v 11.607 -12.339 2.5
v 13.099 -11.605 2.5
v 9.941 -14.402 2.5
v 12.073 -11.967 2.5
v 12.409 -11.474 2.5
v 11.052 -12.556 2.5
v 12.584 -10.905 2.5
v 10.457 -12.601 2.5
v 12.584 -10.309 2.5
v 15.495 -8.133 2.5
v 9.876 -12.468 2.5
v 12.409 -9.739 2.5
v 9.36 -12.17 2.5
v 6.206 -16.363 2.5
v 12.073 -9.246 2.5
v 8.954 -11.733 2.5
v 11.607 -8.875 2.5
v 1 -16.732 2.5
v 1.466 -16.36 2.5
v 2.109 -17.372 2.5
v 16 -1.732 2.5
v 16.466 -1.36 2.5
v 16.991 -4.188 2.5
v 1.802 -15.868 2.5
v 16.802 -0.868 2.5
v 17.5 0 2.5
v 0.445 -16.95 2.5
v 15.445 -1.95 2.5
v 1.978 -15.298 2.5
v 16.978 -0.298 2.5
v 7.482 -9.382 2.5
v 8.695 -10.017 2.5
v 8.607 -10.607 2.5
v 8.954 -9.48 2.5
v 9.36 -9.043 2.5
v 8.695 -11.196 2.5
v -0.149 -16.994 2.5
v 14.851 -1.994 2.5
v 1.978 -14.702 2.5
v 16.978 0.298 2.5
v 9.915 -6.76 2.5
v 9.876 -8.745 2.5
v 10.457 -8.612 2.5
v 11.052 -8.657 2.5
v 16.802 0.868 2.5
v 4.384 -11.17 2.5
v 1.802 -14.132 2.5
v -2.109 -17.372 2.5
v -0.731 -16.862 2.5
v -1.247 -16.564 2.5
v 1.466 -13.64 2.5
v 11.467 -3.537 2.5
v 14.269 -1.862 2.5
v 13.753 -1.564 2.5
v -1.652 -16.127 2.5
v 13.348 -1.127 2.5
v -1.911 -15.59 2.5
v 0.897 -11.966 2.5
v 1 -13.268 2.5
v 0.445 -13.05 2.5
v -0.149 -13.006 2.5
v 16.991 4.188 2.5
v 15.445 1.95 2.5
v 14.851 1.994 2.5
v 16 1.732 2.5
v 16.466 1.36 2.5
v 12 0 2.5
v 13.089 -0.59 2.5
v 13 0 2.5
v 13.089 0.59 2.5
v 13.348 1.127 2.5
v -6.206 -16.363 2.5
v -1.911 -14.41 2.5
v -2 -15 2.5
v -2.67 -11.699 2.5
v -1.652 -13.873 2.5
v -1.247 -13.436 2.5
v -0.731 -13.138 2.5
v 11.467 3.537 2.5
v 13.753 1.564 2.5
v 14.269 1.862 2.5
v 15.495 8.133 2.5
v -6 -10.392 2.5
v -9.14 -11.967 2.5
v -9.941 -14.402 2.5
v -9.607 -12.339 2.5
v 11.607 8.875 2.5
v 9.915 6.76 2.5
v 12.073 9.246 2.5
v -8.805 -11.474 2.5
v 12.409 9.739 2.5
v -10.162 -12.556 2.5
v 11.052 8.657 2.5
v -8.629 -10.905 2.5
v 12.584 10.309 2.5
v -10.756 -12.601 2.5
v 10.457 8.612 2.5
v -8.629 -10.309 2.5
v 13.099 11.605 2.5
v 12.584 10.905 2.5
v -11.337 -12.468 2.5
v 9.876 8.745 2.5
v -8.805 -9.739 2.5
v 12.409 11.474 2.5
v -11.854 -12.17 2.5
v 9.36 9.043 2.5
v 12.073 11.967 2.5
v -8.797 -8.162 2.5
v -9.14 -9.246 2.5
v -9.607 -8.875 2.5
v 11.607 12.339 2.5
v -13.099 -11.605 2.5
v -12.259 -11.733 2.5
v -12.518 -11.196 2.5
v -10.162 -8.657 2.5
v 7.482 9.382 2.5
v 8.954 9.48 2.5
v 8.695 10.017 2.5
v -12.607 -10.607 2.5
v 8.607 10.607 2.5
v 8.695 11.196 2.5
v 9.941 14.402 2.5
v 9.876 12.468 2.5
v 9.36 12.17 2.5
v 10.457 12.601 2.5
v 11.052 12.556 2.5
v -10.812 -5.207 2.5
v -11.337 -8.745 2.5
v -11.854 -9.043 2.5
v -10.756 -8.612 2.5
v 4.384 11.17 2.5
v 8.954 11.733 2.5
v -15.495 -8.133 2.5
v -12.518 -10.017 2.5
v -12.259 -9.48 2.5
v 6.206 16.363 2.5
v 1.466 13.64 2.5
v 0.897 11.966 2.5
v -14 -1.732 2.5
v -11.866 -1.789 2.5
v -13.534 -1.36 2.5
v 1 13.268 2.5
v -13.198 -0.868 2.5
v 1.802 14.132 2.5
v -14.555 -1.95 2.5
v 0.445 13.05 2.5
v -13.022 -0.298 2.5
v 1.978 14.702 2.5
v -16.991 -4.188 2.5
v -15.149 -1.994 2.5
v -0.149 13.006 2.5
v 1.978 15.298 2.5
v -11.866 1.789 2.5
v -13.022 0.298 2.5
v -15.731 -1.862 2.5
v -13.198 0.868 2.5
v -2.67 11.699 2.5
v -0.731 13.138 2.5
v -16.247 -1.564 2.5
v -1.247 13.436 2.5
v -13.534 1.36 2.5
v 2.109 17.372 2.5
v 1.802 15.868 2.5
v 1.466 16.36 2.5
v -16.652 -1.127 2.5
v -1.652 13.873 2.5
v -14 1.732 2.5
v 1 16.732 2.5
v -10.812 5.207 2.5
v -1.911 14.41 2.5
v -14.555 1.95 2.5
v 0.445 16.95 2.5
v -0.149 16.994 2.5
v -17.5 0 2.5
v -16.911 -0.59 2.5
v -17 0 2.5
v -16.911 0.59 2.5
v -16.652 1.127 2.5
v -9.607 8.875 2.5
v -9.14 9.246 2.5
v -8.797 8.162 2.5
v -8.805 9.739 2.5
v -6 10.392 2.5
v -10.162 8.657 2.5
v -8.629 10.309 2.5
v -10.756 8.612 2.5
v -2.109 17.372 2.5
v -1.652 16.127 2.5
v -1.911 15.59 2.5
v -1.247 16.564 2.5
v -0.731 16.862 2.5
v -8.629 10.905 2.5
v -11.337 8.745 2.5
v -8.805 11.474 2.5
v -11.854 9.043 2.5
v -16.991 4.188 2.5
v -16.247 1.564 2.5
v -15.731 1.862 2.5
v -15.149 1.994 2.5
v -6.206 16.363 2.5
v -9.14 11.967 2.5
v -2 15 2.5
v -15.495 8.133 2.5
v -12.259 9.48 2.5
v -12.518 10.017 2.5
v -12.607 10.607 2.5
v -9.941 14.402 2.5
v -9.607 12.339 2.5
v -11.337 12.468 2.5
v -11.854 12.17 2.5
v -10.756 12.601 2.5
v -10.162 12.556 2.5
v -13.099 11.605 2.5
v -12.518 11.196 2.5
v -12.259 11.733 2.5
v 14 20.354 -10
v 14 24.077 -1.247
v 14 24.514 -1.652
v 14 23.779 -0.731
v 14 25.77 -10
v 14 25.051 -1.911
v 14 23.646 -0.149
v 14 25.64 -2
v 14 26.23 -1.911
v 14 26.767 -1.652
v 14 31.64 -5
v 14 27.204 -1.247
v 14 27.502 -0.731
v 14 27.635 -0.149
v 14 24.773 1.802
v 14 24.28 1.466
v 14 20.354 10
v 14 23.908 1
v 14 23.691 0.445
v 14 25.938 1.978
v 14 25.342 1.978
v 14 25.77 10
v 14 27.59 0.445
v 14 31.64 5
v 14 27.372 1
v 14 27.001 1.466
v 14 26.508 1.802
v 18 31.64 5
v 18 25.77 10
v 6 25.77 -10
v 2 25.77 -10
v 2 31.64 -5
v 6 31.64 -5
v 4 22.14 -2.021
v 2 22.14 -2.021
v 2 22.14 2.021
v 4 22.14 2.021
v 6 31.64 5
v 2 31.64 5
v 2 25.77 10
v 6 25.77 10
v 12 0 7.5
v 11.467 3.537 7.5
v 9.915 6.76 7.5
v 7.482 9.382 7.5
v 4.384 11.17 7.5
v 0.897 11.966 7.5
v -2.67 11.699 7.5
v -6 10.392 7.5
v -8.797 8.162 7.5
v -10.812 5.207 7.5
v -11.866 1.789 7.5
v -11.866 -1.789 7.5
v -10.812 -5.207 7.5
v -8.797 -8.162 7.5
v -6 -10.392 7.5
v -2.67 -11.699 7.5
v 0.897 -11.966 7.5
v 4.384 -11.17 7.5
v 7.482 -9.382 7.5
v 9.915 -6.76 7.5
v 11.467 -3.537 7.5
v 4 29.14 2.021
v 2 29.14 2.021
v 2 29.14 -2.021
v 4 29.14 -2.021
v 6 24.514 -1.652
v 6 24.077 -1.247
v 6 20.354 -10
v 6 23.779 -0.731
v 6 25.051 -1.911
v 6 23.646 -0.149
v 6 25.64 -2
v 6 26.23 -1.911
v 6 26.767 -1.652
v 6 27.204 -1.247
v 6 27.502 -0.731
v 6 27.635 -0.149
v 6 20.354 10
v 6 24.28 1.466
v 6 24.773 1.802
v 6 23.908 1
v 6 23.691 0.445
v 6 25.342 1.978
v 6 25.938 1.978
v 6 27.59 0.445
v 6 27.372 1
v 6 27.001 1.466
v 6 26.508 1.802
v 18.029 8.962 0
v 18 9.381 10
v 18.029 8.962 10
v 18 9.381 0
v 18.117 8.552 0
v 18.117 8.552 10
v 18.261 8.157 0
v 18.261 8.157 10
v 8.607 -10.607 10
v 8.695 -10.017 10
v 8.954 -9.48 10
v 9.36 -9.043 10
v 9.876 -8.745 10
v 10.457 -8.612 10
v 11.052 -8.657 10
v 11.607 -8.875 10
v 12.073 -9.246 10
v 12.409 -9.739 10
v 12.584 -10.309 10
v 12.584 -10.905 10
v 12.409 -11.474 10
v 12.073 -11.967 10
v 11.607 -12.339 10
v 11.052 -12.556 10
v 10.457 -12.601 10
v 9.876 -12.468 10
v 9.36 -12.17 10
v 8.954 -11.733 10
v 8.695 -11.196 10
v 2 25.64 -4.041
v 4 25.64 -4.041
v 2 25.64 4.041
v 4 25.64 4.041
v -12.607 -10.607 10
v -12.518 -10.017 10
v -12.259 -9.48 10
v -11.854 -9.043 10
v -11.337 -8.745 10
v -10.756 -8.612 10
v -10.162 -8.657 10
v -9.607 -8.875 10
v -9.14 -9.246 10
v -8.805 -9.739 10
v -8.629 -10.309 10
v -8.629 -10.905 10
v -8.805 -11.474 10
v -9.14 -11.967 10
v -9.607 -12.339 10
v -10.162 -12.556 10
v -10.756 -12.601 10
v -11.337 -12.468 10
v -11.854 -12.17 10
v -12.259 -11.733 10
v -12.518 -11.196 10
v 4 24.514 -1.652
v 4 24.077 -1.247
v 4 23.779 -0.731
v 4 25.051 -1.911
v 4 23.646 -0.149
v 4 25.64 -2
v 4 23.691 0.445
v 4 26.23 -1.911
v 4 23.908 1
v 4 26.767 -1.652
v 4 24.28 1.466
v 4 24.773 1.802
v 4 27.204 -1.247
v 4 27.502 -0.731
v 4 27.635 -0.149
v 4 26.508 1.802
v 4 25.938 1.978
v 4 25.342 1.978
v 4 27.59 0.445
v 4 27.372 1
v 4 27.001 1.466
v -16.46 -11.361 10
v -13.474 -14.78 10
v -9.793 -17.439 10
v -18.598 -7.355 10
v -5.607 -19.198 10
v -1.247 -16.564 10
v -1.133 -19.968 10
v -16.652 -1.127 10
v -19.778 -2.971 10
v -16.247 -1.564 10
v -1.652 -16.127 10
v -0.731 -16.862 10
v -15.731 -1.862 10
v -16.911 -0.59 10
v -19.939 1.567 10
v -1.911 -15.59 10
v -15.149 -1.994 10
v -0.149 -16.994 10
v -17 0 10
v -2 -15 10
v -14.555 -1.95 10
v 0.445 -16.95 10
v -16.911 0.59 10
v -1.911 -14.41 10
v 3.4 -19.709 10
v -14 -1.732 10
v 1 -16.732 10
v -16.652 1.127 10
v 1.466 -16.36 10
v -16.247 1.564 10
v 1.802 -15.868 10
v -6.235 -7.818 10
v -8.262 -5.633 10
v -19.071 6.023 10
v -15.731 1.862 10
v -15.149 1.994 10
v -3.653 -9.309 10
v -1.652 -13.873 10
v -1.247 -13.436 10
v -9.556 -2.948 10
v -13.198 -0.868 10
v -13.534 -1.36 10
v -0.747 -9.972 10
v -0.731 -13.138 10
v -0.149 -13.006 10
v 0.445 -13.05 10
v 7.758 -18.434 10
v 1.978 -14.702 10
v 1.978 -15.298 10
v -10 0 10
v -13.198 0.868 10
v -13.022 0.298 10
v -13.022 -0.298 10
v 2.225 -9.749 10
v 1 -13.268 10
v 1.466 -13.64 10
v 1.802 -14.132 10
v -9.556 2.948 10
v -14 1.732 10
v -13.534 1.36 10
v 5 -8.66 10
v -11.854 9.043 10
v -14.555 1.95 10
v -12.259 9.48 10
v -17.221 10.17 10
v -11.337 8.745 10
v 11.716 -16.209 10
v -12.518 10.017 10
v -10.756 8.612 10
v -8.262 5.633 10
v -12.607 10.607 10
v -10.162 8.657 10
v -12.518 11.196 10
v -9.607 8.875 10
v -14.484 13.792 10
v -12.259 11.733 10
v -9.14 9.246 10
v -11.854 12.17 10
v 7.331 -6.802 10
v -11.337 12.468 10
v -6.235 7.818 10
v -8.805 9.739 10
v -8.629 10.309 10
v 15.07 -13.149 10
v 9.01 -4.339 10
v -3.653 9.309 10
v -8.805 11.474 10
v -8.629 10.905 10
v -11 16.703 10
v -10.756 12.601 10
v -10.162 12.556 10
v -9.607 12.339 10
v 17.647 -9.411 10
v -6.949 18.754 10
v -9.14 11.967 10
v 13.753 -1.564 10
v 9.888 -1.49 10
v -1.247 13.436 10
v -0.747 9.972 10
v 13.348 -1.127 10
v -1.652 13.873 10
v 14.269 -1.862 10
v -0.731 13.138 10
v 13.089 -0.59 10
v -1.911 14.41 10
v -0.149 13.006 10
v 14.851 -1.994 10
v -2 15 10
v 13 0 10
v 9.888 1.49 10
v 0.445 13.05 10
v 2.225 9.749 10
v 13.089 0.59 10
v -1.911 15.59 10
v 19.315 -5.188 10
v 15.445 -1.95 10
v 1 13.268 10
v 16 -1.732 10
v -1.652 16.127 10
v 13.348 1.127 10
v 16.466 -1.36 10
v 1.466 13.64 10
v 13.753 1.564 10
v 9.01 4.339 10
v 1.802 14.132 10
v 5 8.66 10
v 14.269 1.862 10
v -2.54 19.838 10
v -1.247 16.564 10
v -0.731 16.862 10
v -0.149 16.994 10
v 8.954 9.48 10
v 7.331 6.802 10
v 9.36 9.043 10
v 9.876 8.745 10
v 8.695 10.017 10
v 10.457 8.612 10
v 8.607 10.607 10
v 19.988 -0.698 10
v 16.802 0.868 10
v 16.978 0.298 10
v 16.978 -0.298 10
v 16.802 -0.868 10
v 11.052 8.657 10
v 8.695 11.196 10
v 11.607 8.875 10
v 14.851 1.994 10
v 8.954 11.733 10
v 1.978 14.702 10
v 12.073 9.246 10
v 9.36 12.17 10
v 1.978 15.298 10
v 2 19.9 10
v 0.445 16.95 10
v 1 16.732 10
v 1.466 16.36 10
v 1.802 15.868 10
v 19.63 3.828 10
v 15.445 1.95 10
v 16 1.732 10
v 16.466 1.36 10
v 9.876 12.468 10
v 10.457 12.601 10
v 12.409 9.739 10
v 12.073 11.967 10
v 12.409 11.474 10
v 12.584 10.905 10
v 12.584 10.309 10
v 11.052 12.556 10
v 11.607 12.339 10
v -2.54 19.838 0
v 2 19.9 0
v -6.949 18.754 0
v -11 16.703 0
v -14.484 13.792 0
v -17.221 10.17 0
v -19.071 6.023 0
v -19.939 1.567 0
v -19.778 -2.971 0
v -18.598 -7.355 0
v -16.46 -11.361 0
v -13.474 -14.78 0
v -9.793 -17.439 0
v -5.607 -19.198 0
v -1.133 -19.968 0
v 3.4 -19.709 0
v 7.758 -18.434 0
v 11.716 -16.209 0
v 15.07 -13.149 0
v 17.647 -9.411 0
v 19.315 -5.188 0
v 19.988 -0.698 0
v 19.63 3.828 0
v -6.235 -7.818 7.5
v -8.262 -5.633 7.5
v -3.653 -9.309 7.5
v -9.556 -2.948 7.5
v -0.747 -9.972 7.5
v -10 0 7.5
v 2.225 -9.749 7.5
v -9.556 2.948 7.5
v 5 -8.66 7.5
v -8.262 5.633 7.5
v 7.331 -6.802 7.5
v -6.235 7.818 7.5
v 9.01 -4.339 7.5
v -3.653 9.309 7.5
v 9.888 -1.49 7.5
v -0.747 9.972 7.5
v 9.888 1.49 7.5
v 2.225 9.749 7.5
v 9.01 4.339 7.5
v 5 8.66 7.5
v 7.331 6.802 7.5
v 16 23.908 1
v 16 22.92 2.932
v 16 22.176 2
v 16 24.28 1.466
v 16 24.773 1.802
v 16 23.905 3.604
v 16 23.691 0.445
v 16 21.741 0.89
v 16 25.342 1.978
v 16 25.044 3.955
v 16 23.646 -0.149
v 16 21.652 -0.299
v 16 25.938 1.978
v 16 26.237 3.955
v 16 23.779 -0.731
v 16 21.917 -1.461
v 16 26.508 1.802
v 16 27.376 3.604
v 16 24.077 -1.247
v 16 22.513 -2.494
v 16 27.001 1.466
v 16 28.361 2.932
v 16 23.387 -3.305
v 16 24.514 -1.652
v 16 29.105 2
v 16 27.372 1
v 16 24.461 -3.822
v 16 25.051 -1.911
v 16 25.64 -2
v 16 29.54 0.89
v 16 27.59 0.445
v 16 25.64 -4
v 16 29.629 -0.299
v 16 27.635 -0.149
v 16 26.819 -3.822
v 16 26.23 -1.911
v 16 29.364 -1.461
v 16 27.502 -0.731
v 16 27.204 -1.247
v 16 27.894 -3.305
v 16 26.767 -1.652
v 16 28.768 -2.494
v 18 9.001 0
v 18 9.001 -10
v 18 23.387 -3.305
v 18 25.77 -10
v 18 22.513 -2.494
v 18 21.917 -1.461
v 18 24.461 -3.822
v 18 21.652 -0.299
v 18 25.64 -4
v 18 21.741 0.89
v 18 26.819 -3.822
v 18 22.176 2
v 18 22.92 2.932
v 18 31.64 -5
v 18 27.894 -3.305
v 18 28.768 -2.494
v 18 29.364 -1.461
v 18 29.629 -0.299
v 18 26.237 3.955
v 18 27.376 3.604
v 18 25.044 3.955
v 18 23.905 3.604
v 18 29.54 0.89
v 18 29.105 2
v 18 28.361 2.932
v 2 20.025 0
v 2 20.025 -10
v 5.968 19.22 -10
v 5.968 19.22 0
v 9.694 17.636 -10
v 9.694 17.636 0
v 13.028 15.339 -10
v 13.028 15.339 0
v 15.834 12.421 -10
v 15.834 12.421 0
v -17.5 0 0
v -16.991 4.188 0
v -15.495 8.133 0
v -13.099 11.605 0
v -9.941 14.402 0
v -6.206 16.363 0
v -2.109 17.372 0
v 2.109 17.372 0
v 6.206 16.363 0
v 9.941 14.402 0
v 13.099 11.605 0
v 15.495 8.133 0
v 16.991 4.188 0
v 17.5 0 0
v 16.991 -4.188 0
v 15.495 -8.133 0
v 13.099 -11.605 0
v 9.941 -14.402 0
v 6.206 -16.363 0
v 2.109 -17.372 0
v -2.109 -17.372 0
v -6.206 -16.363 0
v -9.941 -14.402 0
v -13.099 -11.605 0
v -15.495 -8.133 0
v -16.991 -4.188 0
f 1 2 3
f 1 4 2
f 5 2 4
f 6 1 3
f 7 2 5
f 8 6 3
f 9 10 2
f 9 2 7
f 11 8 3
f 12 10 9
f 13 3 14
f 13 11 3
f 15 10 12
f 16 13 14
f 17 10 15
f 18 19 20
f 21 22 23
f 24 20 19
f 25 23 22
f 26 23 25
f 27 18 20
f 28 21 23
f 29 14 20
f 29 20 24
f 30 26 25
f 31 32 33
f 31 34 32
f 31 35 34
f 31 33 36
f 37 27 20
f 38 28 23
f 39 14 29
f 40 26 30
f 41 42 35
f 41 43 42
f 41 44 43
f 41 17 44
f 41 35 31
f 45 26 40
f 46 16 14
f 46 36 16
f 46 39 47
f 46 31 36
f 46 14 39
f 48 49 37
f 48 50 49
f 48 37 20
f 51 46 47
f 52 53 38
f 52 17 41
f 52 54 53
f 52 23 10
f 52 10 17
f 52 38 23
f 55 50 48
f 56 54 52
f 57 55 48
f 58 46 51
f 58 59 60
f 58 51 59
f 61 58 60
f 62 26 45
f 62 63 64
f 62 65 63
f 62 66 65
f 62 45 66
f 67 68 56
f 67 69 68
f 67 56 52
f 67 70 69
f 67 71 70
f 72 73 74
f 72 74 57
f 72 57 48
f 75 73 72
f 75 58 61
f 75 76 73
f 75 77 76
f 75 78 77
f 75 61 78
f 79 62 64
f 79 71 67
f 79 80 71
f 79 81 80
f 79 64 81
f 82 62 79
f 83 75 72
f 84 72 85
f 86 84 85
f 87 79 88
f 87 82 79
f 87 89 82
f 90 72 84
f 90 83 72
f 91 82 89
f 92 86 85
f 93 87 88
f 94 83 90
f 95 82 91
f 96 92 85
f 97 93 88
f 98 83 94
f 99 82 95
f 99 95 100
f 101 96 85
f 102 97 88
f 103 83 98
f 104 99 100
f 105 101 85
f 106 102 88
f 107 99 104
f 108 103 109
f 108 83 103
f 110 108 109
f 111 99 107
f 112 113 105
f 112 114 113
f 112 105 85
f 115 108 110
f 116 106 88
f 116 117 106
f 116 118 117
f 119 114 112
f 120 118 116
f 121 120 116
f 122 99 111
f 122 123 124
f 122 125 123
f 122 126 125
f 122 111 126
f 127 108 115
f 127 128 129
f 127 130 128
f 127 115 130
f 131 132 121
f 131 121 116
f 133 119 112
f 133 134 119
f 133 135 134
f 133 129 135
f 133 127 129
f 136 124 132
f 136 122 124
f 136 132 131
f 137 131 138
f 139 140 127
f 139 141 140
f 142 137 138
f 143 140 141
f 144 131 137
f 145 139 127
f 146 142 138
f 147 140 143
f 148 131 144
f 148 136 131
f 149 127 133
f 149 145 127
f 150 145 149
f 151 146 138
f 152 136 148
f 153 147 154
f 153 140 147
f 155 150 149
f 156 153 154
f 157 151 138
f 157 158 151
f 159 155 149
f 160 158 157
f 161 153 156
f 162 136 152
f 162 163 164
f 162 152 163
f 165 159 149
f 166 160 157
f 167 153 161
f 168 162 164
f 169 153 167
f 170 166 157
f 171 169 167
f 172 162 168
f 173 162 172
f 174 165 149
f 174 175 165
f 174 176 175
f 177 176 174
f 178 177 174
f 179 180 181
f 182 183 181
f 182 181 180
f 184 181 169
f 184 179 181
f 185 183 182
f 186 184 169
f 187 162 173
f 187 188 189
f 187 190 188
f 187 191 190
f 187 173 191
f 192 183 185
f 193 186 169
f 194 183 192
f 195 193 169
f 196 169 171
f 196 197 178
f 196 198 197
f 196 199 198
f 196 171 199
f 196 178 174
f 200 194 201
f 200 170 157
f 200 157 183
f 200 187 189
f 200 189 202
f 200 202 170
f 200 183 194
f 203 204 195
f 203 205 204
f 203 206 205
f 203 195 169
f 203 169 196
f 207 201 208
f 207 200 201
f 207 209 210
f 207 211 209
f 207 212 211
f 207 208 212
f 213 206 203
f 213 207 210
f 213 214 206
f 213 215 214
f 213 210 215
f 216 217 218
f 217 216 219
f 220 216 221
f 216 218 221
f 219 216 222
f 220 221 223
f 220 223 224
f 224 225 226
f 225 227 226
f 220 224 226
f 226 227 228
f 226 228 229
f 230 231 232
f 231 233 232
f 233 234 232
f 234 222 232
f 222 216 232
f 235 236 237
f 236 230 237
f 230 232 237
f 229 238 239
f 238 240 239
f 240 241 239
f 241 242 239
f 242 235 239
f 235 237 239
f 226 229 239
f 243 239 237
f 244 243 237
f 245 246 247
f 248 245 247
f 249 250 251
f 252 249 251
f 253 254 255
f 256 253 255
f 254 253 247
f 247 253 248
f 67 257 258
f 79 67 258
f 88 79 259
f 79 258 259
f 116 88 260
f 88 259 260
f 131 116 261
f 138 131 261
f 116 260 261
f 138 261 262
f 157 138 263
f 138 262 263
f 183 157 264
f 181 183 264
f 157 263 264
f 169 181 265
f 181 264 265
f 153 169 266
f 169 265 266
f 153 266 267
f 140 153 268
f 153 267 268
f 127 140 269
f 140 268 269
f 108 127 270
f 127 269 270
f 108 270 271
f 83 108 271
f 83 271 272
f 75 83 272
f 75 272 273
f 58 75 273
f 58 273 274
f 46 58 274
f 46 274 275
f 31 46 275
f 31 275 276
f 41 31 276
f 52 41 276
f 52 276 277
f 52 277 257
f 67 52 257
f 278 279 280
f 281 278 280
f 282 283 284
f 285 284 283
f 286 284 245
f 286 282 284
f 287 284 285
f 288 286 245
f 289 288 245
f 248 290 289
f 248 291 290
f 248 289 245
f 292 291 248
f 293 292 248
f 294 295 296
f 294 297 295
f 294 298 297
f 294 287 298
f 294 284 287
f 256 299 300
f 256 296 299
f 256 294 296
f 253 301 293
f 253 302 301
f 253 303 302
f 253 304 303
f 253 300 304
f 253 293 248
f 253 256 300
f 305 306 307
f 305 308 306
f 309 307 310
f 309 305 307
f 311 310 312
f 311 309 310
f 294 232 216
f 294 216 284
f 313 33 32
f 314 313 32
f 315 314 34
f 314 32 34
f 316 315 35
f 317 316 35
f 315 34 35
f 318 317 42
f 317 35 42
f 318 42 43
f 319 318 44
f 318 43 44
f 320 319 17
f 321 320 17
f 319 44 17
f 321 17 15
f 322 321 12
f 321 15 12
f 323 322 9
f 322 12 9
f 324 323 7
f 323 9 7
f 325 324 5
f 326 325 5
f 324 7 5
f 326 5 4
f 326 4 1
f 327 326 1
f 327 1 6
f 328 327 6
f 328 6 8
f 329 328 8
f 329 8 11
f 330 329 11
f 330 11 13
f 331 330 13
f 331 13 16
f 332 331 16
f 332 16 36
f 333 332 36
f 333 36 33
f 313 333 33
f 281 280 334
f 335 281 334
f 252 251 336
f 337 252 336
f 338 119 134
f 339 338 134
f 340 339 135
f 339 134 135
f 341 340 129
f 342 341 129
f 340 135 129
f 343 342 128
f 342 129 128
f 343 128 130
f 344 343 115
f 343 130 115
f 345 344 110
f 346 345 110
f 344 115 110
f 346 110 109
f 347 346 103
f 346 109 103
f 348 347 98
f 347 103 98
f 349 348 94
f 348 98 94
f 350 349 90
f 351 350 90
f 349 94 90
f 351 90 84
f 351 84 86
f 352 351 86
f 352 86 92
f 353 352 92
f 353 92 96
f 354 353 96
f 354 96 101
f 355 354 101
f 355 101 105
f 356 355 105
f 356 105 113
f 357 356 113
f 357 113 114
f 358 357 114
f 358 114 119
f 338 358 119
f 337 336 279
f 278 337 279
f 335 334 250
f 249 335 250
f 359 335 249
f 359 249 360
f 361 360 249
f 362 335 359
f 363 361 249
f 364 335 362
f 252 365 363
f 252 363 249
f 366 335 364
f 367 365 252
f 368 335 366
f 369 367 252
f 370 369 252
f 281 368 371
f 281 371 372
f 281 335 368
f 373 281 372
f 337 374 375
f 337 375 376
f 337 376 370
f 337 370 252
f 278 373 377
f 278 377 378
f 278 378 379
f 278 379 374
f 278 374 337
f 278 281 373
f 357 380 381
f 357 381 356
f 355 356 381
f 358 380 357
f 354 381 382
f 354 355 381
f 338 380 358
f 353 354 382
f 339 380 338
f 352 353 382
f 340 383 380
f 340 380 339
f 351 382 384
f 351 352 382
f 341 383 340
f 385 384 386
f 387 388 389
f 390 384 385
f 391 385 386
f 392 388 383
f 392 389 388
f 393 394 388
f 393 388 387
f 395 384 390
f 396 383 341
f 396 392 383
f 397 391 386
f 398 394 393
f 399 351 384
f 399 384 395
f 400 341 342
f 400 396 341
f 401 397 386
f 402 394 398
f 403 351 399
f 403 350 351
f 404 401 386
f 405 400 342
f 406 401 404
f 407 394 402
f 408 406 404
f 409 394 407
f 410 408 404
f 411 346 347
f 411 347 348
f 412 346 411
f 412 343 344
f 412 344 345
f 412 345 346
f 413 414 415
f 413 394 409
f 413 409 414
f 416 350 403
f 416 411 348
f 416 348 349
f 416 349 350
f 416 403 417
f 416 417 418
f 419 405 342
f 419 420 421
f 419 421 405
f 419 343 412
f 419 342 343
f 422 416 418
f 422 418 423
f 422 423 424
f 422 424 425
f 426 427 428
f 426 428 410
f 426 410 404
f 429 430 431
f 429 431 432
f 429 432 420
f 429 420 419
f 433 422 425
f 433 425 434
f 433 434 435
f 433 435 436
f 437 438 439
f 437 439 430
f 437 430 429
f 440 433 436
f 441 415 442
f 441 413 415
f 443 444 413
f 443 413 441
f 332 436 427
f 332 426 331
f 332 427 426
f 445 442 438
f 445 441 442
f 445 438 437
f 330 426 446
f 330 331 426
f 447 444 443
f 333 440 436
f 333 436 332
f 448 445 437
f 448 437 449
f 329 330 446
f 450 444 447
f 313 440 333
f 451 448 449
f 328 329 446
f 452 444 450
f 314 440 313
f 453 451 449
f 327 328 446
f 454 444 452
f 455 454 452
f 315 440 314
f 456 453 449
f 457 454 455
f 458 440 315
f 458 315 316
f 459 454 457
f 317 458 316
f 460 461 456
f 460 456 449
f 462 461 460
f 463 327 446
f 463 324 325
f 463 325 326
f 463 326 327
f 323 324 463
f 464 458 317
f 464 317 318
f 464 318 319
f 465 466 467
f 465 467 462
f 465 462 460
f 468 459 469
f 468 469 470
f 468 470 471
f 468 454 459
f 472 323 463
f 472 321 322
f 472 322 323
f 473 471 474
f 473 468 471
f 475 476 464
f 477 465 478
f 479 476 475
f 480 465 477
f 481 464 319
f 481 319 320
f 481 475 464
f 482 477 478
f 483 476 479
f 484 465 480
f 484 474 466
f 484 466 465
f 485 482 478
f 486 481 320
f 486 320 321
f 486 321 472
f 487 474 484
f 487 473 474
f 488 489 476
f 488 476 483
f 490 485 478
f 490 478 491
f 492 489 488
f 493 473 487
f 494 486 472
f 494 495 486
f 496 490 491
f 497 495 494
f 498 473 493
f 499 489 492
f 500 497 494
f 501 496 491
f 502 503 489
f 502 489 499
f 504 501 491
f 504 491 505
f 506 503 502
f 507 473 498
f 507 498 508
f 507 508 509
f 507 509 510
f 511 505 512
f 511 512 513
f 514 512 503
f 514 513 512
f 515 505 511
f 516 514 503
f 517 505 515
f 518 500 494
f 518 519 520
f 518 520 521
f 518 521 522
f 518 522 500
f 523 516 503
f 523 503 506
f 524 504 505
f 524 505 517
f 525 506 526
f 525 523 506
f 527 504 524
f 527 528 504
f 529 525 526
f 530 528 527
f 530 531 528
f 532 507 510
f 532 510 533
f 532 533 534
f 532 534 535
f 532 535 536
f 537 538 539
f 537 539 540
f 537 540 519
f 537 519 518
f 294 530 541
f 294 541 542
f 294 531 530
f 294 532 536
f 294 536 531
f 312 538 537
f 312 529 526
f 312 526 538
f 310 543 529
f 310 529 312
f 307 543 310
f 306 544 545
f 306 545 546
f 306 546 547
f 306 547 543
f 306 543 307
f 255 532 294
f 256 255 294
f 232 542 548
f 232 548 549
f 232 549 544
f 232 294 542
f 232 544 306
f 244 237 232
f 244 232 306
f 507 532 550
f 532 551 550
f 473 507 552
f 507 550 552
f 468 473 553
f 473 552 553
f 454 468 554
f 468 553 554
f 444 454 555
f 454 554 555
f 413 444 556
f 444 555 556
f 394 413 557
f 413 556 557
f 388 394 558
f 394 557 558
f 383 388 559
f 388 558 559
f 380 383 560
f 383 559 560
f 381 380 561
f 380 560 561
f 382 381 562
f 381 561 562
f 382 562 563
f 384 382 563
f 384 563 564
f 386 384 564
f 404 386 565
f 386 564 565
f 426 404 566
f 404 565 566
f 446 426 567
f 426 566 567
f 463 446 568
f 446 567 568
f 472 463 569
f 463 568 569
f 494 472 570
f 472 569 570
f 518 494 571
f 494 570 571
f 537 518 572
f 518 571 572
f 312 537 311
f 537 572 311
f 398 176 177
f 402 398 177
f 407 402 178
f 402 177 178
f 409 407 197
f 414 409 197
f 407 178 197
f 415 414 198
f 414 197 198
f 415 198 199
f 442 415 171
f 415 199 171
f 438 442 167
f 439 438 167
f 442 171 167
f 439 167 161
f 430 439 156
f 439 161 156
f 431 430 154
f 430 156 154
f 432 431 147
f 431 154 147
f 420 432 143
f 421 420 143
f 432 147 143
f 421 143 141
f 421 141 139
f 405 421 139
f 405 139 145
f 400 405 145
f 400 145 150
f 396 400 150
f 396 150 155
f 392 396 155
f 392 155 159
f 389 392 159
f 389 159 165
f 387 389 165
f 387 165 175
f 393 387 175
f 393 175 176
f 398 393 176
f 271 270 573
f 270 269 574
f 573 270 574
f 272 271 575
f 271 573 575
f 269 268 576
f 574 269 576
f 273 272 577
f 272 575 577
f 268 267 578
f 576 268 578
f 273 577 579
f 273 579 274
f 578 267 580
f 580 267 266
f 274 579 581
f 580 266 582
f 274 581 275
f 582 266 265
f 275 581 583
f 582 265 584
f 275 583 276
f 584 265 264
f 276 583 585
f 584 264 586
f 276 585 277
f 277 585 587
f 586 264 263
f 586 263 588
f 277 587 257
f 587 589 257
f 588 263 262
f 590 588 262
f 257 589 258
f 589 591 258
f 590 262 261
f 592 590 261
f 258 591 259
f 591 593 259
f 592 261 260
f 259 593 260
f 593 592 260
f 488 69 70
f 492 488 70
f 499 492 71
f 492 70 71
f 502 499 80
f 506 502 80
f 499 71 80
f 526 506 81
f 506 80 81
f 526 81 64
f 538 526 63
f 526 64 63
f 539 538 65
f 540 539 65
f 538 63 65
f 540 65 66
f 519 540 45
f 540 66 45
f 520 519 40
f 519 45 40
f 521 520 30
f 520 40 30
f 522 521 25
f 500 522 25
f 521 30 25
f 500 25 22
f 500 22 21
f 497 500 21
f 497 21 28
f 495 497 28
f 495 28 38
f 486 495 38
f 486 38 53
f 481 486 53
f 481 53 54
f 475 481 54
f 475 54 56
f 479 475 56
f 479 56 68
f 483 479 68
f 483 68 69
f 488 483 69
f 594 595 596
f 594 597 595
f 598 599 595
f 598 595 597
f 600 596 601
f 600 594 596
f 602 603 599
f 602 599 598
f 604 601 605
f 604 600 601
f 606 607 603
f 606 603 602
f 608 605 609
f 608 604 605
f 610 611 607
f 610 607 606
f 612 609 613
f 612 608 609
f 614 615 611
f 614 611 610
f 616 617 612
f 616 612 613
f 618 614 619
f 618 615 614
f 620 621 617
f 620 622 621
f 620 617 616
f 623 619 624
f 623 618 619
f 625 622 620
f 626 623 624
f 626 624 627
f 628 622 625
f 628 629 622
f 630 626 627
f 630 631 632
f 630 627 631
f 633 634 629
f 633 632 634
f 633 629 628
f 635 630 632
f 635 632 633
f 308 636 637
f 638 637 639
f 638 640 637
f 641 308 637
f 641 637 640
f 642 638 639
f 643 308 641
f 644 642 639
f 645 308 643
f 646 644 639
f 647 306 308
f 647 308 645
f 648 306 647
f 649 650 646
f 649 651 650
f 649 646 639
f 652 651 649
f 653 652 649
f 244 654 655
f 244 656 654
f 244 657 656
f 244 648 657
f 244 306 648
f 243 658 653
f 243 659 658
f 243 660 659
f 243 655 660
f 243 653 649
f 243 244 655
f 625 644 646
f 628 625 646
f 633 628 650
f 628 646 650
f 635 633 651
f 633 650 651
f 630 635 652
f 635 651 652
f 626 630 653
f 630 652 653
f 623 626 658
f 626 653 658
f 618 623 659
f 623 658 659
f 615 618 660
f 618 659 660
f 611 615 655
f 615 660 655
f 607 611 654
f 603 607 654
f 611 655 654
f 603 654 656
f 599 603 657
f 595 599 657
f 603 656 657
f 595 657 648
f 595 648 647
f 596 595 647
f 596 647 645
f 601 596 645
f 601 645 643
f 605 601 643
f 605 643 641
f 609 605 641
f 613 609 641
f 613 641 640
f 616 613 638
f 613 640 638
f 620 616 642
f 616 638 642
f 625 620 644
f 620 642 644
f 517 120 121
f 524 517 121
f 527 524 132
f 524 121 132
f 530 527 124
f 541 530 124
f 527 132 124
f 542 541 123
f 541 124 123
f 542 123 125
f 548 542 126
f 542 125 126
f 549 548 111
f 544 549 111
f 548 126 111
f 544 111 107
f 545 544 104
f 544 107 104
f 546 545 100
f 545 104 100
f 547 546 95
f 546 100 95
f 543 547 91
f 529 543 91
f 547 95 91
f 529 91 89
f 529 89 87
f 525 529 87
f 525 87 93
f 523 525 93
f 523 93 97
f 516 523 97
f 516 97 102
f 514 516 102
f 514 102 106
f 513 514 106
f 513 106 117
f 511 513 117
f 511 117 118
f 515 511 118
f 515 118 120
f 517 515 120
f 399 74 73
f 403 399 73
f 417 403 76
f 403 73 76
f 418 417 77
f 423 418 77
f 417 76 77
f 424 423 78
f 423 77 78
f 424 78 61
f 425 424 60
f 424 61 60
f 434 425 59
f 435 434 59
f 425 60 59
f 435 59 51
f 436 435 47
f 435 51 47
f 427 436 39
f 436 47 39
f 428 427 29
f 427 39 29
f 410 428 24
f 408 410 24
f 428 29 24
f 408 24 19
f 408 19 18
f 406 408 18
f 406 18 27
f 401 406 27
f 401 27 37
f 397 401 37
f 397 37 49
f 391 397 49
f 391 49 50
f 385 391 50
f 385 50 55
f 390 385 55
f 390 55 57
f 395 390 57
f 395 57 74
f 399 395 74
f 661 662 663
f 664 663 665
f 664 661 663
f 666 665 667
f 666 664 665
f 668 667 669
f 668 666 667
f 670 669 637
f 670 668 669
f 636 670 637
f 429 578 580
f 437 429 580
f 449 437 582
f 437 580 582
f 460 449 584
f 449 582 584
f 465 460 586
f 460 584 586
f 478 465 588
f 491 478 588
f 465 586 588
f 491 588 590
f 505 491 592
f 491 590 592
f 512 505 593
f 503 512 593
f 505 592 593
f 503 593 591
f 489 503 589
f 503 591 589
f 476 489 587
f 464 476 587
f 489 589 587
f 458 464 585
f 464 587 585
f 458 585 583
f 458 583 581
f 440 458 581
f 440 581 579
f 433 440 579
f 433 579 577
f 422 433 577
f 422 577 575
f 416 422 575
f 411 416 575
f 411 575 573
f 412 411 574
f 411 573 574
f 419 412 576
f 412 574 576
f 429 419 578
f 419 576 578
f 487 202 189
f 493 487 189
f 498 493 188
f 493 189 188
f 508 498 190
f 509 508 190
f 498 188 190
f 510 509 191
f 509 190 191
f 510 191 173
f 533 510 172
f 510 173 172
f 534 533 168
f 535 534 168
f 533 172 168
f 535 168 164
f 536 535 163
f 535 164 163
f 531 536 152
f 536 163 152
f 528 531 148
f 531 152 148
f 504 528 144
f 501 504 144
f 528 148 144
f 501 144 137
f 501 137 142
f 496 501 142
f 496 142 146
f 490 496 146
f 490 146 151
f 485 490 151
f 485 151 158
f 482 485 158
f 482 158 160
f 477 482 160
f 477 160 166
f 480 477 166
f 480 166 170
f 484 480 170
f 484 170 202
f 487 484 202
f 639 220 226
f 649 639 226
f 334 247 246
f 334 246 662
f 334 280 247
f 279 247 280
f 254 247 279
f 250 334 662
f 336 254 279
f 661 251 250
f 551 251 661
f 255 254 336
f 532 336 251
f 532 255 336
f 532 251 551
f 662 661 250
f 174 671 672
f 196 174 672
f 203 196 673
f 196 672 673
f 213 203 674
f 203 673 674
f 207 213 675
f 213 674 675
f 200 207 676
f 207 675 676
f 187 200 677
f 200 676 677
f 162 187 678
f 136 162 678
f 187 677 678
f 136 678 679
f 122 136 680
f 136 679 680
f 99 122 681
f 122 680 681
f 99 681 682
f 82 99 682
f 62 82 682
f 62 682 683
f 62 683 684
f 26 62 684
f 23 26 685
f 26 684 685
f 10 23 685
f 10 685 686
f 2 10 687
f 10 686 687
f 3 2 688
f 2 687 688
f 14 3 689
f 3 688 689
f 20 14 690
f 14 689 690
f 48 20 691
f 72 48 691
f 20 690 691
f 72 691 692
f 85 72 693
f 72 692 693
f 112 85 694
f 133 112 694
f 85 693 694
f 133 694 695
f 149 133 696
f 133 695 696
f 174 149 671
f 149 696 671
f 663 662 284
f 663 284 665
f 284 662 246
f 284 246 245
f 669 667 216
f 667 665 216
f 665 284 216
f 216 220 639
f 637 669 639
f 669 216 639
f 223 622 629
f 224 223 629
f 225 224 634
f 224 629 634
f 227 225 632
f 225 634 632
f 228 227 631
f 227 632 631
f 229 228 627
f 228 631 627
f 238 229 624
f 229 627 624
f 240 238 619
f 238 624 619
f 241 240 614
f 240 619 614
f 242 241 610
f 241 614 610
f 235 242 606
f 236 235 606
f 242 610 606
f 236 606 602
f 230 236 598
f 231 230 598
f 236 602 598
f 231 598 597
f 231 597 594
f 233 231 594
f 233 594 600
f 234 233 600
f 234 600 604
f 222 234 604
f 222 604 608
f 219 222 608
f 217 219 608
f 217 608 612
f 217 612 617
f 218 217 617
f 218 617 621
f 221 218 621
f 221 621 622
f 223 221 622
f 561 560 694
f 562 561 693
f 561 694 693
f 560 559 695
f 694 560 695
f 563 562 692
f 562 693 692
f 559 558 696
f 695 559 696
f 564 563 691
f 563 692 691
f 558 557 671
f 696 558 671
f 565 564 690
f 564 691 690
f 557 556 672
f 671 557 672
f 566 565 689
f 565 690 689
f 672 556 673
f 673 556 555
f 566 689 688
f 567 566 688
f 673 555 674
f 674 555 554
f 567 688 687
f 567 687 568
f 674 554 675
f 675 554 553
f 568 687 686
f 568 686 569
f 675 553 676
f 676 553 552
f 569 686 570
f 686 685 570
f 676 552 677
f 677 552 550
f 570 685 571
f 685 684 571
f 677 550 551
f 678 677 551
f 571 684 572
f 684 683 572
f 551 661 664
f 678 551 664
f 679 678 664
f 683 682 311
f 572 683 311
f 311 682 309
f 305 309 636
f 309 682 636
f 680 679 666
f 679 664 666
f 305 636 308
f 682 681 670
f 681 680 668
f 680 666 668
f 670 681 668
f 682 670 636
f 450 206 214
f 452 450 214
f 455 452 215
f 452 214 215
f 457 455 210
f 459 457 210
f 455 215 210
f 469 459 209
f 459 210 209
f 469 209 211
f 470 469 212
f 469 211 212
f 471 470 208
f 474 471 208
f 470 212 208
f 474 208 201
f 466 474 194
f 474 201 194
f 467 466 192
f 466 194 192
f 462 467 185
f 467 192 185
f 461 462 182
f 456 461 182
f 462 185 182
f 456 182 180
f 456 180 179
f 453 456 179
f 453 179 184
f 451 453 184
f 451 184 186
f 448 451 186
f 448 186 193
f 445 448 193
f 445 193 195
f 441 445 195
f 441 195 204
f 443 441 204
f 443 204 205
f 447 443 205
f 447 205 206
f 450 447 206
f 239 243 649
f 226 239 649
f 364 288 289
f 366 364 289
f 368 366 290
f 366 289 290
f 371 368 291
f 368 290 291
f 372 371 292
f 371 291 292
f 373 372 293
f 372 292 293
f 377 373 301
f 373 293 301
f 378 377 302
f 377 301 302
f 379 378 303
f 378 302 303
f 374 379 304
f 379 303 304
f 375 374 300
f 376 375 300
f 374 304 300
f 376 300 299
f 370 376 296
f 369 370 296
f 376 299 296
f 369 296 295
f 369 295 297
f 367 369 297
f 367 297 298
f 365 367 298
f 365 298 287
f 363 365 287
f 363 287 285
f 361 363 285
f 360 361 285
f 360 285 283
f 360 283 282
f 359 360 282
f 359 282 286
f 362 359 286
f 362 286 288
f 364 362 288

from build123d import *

# Parameters (mm, degrees)
SKETCH1_R               = 20
SKETCH1_R_2             = 15
BOSS_EXTRUDE1_DEPTH     = 10
BOSS_EXTRUDE2_DEPTH     = 20
SKETCH3_W               = 4
SKETCH3_H               = 31.92260483
BOSS_EXTRUDE4_DEPTH     = 20
BOSS_EXTRUDE5_DEPTH     = 20
SKETCH4_R               = 20
CUT_EXTRUDE1_DEPTH      = 11
CUT_EXTRUDE2_DEPTH      = 39
CUT_EXTRUDE3_DEPTH      = 39
SKETCH8_R               = 2
CUT_EXTRUDE4_DEPTH      = 39
FILLET4_R               = 3
SKETCH9_W               = 21.007104118
SKETCH9_H               = 10.314289307
CUT_EXTRUDE5_DEPTH      = 3
CUT_EXTRUDE5_DEPTH_BACK = 39
CUT_EXTRUDE6_DEPTH      = 19
CUT_EXTRUDE7_DEPTH      = 19
SKETCH12_R              = 4
CUT_EXTRUDE8_DEPTH      = 2
CUT_EXTRUDE9_DEPTH      = 2
BOSS_EXTRUDE7_DEPTH     = 20
SKETCH19_R              = 20.125
CUT_EXTRUDE11_DEPTH     = 11
SKETCH20_R              = 15
SKETCH20_R_2            = 12
BOSS_EXTRUDE8_DEPTH     = 10
SKETCH21_R              = 12
BOSS_EXTRUDE9_DEPTH     = 2.5
SKETCH22_R              = 10
CUT_EXTRUDE12_DEPTH     = 2.5
SKETCH23_R              = 17.5
CUT_EXTRUDE13_DEPTH     = 2.5
SKETCH24_R              = 2
CUT_EXTRUDE14_DEPTH     = 8.5


with BuildPart() as part:
    # Sketch1 → Boss-Extrude1 (new body)
    with BuildSketch(Plane.XY):
        Circle(SKETCH1_R)
        Circle(SKETCH1_R_2, mode=Mode.SUBTRACT)
    extrude(amount=BOSS_EXTRUDE1_DEPTH)

    # Sketch2 → Boss-Extrude2 (add)
    with BuildSketch(Plane.XY.offset(10)):
        with BuildLine():
            Line((2, 39.866068747), (2, 19.899748742))
            ThreePointArc((2, 19.899748742), (4.02100681, 19.591618214), (6, 19.078784028))
            Line((6, 19.078784028), (6, 39.866068747))
            Line((6, 39.866068747), (2, 39.866068747))
        make_face()
    extrude(amount=-BOSS_EXTRUDE2_DEPTH)

    # Sketch3 → Boss-Extrude4 (add)
    with BuildSketch(Plane.XY.offset(10)):
        with Locations((16, 24.679100302)):
            Rectangle(SKETCH3_W, SKETCH3_H)
    extrude(amount=-BOSS_EXTRUDE4_DEPTH)

    # Sketch5 → Boss-Extrude5 (add)
    with BuildSketch(Plane.XY.offset(10)):
        Polygon((14, 20.353512461), (10.603962903, 16.957475365), (14, 14.282856857), align=None)
    extrude(amount=-BOSS_EXTRUDE5_DEPTH)

    # Sketch4 → Cut-Extrude1 (cut, through all)
    with BuildSketch(Plane(origin=(0, 0, 0), x_dir=(-1, 0, 0), z_dir=(0, 0, -1))):
        Circle(SKETCH4_R)
    extrude(amount=CUT_EXTRUDE1_DEPTH, mode=Mode.SUBTRACT)

    # Sketch6 → Cut-Extrude2 (cut, through all)
    with BuildSketch(Plane(origin=(18, 0, 0), x_dir=(0, 0, -1), z_dir=(1, 0, 0))):
        Polygon((-10, 40.640402717), (-6, 40.640402717), (-10, 36.640402717), align=None)
    extrude(amount=-CUT_EXTRUDE2_DEPTH, mode=Mode.SUBTRACT)

    # Sketch7 → Cut-Extrude3 (cut, through all)
    with BuildSketch(Plane(origin=(18, 0, 0), x_dir=(0, 0, -1), z_dir=(1, 0, 0))):
        Polygon((10, 40.640402717), (6, 40.640402717), (10, 36.640402717), align=None)
    extrude(amount=-CUT_EXTRUDE3_DEPTH, mode=Mode.SUBTRACT)

    # Sketch8 → Cut-Extrude4 (cut, through all)
    with BuildSketch(Plane(origin=(18, 0, 0), x_dir=(0, 0, -1), z_dir=(1, 0, 0))):
        with Locations((0, 25.640402717)):
            Circle(SKETCH8_R)
    extrude(amount=-CUT_EXTRUDE4_DEPTH, mode=Mode.SUBTRACT)

    # Fillet4
    fillet4_edges = [part.edges().sort_by_distance(p)[0] for p in [
        (18, 8.717797887, 5),
    ]]
    fillet(fillet4_edges, radius=FILLET4_R)

    # Sketch9 → Cut-Extrude5 (cut, two sides)
    with BuildSketch(Plane(origin=(18, 0, 0), x_dir=(0, 0, -1), z_dir=(1, 0, 0))) as cut_extrude5_sk:
        with Locations((0.503552059, 36.79754737)):
            Rectangle(SKETCH9_W, SKETCH9_H)
    extrude(amount=CUT_EXTRUDE5_DEPTH, mode=Mode.SUBTRACT)
    extrude(cut_extrude5_sk.sketch, amount=-CUT_EXTRUDE5_DEPTH_BACK, mode=Mode.SUBTRACT)

    # Sketch10 → Cut-Extrude6 (cut, through all)
    with BuildSketch(Plane.ZY.offset(-2)):
        Polygon((10, 31.640402717), (5, 31.640402717), (10, 25.770075729), align=None)
    extrude(amount=-CUT_EXTRUDE6_DEPTH, mode=Mode.SUBTRACT)

    # Sketch11 → Cut-Extrude7 (cut, through all)
    with BuildSketch(Plane.ZY.offset(-2)):
        Polygon((-10, 31.640402717), (-10, 25.770075729), (-5, 31.640402717), align=None)
    extrude(amount=-CUT_EXTRUDE7_DEPTH, mode=Mode.SUBTRACT)

    # Sketch12 → Cut-Extrude8 (cut)
    with BuildSketch(Plane(origin=(18, 0, 0), x_dir=(0, 0, -1), z_dir=(1, 0, 0))):
        with Locations((0, 25.640402717)):
            Circle(SKETCH12_R)
    extrude(amount=-CUT_EXTRUDE8_DEPTH, mode=Mode.SUBTRACT)

    # Sketch13 → Cut-Extrude9 (cut)
    with BuildSketch(Plane.ZY.offset(-2)):
        Polygon((4.041451884, 25.640402717), (2.020725942, 29.140402717), (-2.020725942, 29.140402717), (-4.041451884, 25.640402717), (-2.020725942, 22.140402717), (2.020725942, 22.140402717), align=None)
    extrude(amount=-CUT_EXTRUDE9_DEPTH, mode=Mode.SUBTRACT)

    # Sketch16 → Boss-Extrude7 (add)
    with BuildSketch(Plane.XY.offset(10)):
        with BuildLine():
            Line((14, 20.353512461), (6, 20.353512461))
            Line((6, 20.353512461), (6, 19.078784028))
            ThreePointArc((6, 19.078784028), (8.369461371, 18.164584123), (10.603962903, 16.957475365))
            Line((10.603962903, 16.957475365), (14, 20.353512461))
        make_face()
    extrude(amount=-BOSS_EXTRUDE7_DEPTH)

    # Sketch19 → Cut-Extrude11 (cut, through all)
    with BuildSketch(Plane(origin=(0, 0, 0), x_dir=(-1, 0, 0), z_dir=(0, 0, -1))):
        Circle(SKETCH19_R)
    extrude(amount=CUT_EXTRUDE11_DEPTH, mode=Mode.SUBTRACT)

    # Sketch20 → Boss-Extrude8 (add)
    with BuildSketch(Plane.XY.offset(10)):
        Circle(SKETCH20_R)
        Circle(SKETCH20_R_2, mode=Mode.SUBTRACT)
    extrude(amount=-BOSS_EXTRUDE8_DEPTH)

    # Sketch21 → Boss-Extrude9 (add)
    with BuildSketch(Plane.XY.offset(10)):
        Circle(SKETCH21_R)
    extrude(amount=-BOSS_EXTRUDE9_DEPTH)

    # Sketch22 → Cut-Extrude12 (cut)
    with BuildSketch(Plane(origin=(0, 0, 7.5), x_dir=(-1, 0, 0), z_dir=(0, 0, -1))):
        Circle(SKETCH22_R)
    extrude(amount=-CUT_EXTRUDE12_DEPTH, mode=Mode.SUBTRACT)

    # Sketch23 → Cut-Extrude13 (cut)
    with BuildSketch(Plane(origin=(0, 0, 0), x_dir=(-1, 0, 0), z_dir=(0, 0, -1))):
        Circle(SKETCH23_R)
    extrude(amount=-CUT_EXTRUDE13_DEPTH, mode=Mode.SUBTRACT)

    # Sketch24 → Cut-Extrude14 (cut, through all)
    with BuildSketch(Plane(origin=(0, 0, 2.5), x_dir=(-1, 0, 0), z_dir=(0, 0, -1))):
        with Locations((0, 15)):
            Circle(SKETCH24_R)
        with Locations((10.606601718, 10.606601718)):
            Circle(SKETCH24_R)
        with Locations((15, 0)):
            Circle(SKETCH24_R)
        with Locations((10.606601718, -10.606601718)):
            Circle(SKETCH24_R)
        with Locations((0, -15)):
            Circle(SKETCH24_R)
        with Locations((-10.606601718, -10.606601718)):
            Circle(SKETCH24_R)
        with Locations((-15, 0)):
            Circle(SKETCH24_R)
        with Locations((-10.606601718, 10.606601718)):
            Circle(SKETCH24_R)
    extrude(amount=-CUT_EXTRUDE14_DEPTH, mode=Mode.SUBTRACT)


solid = part.part
